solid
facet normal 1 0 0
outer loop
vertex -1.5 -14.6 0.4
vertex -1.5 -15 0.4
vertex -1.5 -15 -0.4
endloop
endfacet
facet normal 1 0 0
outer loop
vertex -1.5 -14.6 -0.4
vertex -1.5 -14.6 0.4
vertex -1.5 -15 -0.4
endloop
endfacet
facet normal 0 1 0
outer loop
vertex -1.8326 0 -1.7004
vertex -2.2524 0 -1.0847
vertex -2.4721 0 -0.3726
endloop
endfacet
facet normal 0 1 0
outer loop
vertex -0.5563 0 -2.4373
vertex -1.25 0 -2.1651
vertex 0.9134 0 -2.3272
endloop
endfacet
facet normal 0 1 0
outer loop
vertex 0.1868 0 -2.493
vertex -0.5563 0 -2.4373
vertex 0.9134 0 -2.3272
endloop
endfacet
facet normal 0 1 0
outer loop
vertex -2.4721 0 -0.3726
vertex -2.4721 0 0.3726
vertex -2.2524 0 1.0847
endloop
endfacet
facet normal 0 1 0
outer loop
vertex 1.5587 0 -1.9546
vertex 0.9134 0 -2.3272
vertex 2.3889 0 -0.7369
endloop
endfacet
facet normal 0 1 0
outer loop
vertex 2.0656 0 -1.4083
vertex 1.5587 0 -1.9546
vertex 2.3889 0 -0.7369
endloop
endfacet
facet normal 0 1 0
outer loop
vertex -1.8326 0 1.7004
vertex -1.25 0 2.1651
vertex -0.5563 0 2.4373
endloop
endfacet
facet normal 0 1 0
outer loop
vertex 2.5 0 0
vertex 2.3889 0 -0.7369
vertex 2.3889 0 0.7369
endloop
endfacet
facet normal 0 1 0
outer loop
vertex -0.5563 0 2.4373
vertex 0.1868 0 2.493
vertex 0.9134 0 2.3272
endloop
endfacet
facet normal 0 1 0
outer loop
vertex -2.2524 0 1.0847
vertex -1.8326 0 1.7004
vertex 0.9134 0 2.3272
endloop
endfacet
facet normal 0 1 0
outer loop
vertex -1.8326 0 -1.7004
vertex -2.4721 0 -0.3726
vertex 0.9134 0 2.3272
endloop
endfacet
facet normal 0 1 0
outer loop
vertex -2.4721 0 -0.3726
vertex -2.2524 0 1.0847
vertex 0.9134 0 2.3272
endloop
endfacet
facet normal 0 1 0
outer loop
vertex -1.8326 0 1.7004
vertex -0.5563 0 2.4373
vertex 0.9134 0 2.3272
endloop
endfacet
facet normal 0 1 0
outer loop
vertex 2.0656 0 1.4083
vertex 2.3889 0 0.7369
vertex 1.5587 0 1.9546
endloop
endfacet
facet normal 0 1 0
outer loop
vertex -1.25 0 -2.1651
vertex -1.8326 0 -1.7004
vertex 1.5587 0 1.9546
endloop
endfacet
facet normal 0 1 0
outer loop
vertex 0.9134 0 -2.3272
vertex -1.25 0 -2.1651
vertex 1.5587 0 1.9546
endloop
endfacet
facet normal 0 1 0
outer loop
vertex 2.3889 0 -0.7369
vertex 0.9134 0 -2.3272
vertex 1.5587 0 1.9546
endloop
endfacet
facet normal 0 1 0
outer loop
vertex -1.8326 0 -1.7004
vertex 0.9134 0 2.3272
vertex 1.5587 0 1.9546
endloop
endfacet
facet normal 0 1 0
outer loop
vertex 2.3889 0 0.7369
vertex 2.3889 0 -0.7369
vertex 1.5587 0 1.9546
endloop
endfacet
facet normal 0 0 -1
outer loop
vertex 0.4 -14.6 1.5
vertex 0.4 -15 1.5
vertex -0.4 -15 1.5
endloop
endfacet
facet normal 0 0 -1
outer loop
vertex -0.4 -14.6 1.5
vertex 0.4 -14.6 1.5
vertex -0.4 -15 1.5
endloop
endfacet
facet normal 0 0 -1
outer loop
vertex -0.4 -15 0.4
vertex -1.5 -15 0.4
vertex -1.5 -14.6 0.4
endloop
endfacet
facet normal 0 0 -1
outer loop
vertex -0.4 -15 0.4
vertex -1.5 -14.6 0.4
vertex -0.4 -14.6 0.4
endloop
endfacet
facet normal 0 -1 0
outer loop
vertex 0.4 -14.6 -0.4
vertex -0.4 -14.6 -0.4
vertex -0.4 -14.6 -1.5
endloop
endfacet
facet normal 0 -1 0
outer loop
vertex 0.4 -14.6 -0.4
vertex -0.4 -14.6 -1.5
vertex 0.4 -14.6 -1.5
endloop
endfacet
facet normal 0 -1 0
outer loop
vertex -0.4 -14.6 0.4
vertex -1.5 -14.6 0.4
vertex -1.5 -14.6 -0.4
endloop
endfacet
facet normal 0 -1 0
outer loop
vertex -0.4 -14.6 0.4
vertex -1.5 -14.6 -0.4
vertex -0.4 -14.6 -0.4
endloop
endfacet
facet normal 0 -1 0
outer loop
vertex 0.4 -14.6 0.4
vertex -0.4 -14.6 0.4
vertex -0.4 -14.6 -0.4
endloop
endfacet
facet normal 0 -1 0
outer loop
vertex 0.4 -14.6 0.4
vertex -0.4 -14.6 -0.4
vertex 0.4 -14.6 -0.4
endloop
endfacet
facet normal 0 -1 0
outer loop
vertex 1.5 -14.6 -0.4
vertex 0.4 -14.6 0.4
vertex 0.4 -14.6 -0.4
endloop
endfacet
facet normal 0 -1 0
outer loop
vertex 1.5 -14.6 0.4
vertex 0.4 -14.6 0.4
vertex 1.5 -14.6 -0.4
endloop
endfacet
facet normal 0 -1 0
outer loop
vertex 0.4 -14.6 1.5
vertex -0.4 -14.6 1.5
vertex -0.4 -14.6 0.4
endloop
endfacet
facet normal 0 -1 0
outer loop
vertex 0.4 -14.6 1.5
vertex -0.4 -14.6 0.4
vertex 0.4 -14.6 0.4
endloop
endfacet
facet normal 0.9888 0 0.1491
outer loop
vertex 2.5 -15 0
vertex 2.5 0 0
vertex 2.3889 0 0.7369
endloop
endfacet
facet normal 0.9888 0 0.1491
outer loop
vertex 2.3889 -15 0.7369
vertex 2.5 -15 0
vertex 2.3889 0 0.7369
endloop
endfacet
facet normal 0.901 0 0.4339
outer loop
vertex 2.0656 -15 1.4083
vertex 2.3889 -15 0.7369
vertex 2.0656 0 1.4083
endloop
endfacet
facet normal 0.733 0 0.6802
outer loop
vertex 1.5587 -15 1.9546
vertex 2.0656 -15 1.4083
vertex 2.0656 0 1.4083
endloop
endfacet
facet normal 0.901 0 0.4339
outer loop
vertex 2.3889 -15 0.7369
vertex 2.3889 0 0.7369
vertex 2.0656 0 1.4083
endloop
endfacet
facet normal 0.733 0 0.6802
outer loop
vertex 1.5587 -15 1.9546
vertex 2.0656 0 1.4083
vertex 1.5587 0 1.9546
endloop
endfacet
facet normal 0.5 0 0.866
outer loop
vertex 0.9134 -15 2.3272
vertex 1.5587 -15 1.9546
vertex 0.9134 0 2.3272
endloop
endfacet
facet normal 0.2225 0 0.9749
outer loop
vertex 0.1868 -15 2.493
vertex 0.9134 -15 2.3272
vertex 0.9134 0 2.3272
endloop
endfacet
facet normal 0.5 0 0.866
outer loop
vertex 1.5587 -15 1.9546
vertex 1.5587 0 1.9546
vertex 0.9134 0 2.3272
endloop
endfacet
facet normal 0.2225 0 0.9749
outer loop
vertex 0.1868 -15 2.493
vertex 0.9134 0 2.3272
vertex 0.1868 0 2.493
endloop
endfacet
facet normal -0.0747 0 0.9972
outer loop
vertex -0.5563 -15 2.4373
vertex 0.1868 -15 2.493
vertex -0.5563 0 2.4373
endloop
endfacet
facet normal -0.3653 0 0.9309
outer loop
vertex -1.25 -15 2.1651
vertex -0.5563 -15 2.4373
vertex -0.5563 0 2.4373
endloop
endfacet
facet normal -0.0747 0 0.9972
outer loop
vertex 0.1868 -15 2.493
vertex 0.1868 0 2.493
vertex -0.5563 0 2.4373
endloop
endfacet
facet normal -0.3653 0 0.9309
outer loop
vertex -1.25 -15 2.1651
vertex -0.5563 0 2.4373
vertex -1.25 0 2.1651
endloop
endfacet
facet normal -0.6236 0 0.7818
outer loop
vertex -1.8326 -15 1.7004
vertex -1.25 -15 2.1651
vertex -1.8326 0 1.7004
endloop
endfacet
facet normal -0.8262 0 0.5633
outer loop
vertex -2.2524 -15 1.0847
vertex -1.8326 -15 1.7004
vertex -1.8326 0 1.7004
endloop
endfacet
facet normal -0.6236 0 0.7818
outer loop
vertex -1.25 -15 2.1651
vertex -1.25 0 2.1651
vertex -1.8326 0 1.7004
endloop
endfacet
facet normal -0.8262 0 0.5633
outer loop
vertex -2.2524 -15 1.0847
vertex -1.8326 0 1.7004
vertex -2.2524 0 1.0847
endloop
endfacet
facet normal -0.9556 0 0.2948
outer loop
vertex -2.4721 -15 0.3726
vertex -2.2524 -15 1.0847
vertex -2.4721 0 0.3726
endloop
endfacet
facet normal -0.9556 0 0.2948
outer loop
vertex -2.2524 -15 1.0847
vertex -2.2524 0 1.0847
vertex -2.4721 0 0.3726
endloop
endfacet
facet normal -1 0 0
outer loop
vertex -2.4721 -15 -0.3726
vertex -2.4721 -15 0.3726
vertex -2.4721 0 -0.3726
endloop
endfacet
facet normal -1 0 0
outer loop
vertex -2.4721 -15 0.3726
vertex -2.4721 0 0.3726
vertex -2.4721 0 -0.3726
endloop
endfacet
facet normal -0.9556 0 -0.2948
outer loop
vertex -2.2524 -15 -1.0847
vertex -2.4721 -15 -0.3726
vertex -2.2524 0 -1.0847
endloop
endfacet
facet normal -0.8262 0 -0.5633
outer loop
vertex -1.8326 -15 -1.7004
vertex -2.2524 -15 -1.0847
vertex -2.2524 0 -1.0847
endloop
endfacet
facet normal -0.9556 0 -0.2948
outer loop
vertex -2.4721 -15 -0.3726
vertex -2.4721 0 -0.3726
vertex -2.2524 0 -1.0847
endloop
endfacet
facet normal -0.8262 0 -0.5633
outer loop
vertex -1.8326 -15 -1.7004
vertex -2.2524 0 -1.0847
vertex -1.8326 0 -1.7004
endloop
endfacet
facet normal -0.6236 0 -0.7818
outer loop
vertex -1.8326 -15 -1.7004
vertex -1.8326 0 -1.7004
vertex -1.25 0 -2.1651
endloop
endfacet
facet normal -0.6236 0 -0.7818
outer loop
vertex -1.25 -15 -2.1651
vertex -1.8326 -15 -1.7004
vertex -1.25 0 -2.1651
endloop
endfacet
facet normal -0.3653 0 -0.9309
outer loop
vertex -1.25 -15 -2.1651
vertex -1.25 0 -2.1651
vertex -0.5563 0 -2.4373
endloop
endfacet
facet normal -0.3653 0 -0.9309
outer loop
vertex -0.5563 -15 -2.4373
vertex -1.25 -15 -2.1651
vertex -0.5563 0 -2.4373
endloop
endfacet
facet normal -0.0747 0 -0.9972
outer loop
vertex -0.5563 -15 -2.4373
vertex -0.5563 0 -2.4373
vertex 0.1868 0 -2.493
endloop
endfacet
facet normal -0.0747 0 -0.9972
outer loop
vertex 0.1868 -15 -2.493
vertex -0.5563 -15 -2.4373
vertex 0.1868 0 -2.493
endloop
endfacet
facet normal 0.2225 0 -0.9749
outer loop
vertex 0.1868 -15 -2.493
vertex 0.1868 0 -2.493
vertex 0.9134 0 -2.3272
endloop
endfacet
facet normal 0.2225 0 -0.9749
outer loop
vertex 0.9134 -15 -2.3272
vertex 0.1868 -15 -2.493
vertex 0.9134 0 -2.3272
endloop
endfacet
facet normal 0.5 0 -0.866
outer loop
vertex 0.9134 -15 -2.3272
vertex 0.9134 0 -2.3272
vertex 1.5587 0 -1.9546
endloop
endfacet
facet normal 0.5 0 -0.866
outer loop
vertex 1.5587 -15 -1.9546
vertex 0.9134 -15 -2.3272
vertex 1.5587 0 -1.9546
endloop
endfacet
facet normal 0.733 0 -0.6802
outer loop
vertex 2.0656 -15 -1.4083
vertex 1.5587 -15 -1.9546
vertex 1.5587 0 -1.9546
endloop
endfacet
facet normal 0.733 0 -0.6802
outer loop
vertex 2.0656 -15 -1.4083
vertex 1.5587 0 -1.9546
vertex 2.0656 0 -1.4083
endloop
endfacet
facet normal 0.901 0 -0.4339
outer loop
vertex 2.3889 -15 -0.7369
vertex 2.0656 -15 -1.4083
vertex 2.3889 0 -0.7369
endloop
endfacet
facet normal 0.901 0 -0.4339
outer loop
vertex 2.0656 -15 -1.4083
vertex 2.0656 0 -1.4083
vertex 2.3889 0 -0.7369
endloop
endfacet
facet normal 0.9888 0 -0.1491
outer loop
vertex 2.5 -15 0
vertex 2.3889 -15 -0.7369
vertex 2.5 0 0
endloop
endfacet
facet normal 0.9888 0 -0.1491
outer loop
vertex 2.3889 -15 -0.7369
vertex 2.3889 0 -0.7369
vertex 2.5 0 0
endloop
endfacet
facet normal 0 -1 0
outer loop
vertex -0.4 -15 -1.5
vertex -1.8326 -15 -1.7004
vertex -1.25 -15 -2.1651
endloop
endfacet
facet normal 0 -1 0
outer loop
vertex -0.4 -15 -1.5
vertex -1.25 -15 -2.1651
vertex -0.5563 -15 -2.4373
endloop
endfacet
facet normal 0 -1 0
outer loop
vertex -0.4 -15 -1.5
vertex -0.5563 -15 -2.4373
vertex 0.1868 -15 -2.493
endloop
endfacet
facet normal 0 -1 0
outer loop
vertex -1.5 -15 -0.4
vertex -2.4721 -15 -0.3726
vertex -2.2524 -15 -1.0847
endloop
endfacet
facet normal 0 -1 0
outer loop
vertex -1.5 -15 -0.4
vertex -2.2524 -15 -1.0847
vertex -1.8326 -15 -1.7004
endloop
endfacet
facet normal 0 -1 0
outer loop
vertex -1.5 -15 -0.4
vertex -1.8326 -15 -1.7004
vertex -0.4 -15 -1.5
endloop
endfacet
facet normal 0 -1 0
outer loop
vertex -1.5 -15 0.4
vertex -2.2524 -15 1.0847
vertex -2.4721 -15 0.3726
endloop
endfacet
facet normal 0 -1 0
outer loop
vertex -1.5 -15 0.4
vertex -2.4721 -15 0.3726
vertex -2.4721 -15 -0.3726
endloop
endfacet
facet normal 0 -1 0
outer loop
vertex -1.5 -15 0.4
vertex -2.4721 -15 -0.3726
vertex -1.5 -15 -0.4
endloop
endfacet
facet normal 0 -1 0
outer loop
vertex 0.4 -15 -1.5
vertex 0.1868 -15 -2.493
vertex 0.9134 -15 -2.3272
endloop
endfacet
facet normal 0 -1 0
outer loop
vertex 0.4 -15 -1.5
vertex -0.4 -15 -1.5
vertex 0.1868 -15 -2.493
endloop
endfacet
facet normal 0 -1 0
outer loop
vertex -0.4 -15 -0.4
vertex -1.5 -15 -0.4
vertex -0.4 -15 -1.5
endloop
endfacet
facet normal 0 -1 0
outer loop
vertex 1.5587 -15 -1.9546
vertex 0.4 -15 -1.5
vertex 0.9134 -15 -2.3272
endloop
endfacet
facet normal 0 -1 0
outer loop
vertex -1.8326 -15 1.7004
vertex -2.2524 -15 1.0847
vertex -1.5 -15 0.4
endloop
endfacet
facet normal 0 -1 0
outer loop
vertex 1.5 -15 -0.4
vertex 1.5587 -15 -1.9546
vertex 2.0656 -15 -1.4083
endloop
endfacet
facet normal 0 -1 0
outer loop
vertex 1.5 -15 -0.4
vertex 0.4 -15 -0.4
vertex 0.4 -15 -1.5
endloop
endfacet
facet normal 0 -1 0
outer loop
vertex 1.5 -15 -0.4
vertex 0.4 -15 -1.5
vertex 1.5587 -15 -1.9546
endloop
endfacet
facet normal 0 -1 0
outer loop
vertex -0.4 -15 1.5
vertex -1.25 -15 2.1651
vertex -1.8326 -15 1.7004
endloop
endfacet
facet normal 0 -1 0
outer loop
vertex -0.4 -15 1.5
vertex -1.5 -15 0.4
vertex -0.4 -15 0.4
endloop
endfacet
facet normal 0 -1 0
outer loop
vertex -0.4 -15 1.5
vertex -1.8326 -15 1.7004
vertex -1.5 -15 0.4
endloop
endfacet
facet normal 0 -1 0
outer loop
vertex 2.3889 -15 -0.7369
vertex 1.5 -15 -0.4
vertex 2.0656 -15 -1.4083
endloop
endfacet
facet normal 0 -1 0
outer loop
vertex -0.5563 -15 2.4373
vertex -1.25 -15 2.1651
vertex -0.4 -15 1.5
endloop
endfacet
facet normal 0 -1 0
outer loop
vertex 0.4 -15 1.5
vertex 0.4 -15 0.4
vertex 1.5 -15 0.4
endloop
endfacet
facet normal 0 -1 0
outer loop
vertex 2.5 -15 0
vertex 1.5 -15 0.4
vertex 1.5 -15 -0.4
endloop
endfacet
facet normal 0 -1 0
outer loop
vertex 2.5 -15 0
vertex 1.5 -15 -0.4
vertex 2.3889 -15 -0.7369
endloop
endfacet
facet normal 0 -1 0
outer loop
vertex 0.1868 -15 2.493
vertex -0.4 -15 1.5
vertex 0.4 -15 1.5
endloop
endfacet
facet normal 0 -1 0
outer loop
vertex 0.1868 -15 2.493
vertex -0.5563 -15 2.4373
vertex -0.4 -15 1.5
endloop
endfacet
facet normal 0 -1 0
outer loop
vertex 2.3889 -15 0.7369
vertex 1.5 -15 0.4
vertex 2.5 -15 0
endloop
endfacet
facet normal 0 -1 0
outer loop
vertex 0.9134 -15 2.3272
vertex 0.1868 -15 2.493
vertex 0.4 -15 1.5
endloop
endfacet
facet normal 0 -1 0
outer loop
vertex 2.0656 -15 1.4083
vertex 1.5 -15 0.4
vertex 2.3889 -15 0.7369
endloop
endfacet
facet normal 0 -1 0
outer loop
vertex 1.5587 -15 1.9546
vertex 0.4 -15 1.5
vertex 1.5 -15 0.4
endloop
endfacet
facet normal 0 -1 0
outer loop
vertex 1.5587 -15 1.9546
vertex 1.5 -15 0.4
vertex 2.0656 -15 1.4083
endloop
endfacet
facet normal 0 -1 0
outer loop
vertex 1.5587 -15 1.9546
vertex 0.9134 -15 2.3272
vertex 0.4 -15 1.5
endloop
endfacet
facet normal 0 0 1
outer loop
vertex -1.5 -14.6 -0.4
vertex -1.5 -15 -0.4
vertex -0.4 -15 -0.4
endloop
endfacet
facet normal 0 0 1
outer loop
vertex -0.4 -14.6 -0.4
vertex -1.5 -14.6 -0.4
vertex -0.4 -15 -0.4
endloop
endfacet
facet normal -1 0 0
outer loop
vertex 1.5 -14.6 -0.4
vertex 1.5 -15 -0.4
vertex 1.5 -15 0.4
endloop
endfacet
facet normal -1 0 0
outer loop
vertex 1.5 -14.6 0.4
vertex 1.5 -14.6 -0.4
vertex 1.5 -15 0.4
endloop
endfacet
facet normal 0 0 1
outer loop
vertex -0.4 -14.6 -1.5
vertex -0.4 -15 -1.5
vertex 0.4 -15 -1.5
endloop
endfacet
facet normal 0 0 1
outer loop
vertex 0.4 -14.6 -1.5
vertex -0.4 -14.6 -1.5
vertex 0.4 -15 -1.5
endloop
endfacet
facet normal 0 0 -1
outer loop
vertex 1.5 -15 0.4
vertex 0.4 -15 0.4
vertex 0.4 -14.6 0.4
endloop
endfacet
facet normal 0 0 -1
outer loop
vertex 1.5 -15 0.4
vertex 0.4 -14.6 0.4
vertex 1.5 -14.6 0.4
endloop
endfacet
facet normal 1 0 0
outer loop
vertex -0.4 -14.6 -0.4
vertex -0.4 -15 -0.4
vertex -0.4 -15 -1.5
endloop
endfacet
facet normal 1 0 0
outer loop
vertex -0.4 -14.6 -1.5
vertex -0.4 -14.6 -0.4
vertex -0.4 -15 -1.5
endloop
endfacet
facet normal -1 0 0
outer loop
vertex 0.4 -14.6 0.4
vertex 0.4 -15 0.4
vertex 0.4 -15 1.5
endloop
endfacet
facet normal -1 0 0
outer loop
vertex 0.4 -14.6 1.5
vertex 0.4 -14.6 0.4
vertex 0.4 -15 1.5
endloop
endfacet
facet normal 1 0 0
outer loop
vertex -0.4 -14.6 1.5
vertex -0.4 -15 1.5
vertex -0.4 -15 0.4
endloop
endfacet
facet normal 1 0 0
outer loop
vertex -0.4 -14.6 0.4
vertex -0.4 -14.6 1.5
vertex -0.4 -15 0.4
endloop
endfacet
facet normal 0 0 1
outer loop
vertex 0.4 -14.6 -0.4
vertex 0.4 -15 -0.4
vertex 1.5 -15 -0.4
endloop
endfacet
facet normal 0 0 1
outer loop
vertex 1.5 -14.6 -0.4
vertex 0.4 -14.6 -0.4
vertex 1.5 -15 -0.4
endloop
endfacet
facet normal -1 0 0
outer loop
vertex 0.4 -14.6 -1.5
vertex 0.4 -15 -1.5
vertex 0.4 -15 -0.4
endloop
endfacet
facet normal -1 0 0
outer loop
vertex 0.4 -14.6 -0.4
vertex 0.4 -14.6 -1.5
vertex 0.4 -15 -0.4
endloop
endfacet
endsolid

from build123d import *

# Parameters (mm, degrees)
F0_W     = 120
F0_H     = 4
F1_DEPTH = 4
F3_R     = 2.5
F4_DEPTH = 15
F5_W     = 0.4
F5_H     = 0.4
F5_H_2   = 1.1
F5_W_2   = 1.1
F6_DEPTH = 0.4


with BuildPart() as f1:
    # F0 (on Top) → F1 (new body)
    with BuildSketch(Plane.XY):
        Polygon((-79.6833248483, 0), (-93.6833248483, 0), (-93.6833248483, -12), (-79.6833248483, -12), (-79.6833248483, -8), (-79.6833248483, -4), align=None)
        with Locations((-19.6833248483, -2)):
            Rectangle(F0_W, F0_H)
        Polygon((54.3166751517, 0), (40.3166751517, 0), (40.3166751517, -4), (40.3166751517, -8), (40.3166751517, -12), (54.3166751517, -12), align=None)
        with Locations((-19.6833248483, -10)):
            Rectangle(F0_W, F0_H)
    extrude(amount=F1_DEPTH)


with BuildPart() as f4:
    # F3 (on Front) → F4 (new body)
    with BuildSketch(Plane.XZ):
        Circle(F3_R)
    extrude(amount=F4_DEPTH)

    # F5 (on face) → F6 (cut)
    with BuildSketch(Plane.XZ.offset(15)):
        with Locations((-0.2, 0.2)):
            Rectangle(F5_W, F5_H)
        with Locations((0.2, -0.2)):
            Rectangle(F5_W, F5_H)
        with Locations((-0.2, -0.2)):
            Rectangle(F5_W, F5_H)
        with Locations((0.2, 0.2)):
            Rectangle(F5_W, F5_H)
        with Locations((-0.2, 0.95)):
            Rectangle(F5_W, F5_H_2)
        with Locations((0.2, 0.95)):
            Rectangle(F5_W, F5_H_2)
        with Locations((0.2, -0.95)):
            Rectangle(F5_W, F5_H_2)
        with Locations((-0.2, -0.95)):
            Rectangle(F5_W, F5_H_2)
        with Locations((-0.95, -0.2)):
            Rectangle(F5_W_2, F5_H)
        with Locations((-0.95, 0.2)):
            Rectangle(F5_W_2, F5_H)
        with Locations((0.95, 0.2)):
            Rectangle(F5_W_2, F5_H)
        with Locations((0.95, -0.2)):
            Rectangle(F5_W_2, F5_H)
    extrude(amount=-F6_DEPTH, mode=Mode.SUBTRACT)


solid = f4.part
